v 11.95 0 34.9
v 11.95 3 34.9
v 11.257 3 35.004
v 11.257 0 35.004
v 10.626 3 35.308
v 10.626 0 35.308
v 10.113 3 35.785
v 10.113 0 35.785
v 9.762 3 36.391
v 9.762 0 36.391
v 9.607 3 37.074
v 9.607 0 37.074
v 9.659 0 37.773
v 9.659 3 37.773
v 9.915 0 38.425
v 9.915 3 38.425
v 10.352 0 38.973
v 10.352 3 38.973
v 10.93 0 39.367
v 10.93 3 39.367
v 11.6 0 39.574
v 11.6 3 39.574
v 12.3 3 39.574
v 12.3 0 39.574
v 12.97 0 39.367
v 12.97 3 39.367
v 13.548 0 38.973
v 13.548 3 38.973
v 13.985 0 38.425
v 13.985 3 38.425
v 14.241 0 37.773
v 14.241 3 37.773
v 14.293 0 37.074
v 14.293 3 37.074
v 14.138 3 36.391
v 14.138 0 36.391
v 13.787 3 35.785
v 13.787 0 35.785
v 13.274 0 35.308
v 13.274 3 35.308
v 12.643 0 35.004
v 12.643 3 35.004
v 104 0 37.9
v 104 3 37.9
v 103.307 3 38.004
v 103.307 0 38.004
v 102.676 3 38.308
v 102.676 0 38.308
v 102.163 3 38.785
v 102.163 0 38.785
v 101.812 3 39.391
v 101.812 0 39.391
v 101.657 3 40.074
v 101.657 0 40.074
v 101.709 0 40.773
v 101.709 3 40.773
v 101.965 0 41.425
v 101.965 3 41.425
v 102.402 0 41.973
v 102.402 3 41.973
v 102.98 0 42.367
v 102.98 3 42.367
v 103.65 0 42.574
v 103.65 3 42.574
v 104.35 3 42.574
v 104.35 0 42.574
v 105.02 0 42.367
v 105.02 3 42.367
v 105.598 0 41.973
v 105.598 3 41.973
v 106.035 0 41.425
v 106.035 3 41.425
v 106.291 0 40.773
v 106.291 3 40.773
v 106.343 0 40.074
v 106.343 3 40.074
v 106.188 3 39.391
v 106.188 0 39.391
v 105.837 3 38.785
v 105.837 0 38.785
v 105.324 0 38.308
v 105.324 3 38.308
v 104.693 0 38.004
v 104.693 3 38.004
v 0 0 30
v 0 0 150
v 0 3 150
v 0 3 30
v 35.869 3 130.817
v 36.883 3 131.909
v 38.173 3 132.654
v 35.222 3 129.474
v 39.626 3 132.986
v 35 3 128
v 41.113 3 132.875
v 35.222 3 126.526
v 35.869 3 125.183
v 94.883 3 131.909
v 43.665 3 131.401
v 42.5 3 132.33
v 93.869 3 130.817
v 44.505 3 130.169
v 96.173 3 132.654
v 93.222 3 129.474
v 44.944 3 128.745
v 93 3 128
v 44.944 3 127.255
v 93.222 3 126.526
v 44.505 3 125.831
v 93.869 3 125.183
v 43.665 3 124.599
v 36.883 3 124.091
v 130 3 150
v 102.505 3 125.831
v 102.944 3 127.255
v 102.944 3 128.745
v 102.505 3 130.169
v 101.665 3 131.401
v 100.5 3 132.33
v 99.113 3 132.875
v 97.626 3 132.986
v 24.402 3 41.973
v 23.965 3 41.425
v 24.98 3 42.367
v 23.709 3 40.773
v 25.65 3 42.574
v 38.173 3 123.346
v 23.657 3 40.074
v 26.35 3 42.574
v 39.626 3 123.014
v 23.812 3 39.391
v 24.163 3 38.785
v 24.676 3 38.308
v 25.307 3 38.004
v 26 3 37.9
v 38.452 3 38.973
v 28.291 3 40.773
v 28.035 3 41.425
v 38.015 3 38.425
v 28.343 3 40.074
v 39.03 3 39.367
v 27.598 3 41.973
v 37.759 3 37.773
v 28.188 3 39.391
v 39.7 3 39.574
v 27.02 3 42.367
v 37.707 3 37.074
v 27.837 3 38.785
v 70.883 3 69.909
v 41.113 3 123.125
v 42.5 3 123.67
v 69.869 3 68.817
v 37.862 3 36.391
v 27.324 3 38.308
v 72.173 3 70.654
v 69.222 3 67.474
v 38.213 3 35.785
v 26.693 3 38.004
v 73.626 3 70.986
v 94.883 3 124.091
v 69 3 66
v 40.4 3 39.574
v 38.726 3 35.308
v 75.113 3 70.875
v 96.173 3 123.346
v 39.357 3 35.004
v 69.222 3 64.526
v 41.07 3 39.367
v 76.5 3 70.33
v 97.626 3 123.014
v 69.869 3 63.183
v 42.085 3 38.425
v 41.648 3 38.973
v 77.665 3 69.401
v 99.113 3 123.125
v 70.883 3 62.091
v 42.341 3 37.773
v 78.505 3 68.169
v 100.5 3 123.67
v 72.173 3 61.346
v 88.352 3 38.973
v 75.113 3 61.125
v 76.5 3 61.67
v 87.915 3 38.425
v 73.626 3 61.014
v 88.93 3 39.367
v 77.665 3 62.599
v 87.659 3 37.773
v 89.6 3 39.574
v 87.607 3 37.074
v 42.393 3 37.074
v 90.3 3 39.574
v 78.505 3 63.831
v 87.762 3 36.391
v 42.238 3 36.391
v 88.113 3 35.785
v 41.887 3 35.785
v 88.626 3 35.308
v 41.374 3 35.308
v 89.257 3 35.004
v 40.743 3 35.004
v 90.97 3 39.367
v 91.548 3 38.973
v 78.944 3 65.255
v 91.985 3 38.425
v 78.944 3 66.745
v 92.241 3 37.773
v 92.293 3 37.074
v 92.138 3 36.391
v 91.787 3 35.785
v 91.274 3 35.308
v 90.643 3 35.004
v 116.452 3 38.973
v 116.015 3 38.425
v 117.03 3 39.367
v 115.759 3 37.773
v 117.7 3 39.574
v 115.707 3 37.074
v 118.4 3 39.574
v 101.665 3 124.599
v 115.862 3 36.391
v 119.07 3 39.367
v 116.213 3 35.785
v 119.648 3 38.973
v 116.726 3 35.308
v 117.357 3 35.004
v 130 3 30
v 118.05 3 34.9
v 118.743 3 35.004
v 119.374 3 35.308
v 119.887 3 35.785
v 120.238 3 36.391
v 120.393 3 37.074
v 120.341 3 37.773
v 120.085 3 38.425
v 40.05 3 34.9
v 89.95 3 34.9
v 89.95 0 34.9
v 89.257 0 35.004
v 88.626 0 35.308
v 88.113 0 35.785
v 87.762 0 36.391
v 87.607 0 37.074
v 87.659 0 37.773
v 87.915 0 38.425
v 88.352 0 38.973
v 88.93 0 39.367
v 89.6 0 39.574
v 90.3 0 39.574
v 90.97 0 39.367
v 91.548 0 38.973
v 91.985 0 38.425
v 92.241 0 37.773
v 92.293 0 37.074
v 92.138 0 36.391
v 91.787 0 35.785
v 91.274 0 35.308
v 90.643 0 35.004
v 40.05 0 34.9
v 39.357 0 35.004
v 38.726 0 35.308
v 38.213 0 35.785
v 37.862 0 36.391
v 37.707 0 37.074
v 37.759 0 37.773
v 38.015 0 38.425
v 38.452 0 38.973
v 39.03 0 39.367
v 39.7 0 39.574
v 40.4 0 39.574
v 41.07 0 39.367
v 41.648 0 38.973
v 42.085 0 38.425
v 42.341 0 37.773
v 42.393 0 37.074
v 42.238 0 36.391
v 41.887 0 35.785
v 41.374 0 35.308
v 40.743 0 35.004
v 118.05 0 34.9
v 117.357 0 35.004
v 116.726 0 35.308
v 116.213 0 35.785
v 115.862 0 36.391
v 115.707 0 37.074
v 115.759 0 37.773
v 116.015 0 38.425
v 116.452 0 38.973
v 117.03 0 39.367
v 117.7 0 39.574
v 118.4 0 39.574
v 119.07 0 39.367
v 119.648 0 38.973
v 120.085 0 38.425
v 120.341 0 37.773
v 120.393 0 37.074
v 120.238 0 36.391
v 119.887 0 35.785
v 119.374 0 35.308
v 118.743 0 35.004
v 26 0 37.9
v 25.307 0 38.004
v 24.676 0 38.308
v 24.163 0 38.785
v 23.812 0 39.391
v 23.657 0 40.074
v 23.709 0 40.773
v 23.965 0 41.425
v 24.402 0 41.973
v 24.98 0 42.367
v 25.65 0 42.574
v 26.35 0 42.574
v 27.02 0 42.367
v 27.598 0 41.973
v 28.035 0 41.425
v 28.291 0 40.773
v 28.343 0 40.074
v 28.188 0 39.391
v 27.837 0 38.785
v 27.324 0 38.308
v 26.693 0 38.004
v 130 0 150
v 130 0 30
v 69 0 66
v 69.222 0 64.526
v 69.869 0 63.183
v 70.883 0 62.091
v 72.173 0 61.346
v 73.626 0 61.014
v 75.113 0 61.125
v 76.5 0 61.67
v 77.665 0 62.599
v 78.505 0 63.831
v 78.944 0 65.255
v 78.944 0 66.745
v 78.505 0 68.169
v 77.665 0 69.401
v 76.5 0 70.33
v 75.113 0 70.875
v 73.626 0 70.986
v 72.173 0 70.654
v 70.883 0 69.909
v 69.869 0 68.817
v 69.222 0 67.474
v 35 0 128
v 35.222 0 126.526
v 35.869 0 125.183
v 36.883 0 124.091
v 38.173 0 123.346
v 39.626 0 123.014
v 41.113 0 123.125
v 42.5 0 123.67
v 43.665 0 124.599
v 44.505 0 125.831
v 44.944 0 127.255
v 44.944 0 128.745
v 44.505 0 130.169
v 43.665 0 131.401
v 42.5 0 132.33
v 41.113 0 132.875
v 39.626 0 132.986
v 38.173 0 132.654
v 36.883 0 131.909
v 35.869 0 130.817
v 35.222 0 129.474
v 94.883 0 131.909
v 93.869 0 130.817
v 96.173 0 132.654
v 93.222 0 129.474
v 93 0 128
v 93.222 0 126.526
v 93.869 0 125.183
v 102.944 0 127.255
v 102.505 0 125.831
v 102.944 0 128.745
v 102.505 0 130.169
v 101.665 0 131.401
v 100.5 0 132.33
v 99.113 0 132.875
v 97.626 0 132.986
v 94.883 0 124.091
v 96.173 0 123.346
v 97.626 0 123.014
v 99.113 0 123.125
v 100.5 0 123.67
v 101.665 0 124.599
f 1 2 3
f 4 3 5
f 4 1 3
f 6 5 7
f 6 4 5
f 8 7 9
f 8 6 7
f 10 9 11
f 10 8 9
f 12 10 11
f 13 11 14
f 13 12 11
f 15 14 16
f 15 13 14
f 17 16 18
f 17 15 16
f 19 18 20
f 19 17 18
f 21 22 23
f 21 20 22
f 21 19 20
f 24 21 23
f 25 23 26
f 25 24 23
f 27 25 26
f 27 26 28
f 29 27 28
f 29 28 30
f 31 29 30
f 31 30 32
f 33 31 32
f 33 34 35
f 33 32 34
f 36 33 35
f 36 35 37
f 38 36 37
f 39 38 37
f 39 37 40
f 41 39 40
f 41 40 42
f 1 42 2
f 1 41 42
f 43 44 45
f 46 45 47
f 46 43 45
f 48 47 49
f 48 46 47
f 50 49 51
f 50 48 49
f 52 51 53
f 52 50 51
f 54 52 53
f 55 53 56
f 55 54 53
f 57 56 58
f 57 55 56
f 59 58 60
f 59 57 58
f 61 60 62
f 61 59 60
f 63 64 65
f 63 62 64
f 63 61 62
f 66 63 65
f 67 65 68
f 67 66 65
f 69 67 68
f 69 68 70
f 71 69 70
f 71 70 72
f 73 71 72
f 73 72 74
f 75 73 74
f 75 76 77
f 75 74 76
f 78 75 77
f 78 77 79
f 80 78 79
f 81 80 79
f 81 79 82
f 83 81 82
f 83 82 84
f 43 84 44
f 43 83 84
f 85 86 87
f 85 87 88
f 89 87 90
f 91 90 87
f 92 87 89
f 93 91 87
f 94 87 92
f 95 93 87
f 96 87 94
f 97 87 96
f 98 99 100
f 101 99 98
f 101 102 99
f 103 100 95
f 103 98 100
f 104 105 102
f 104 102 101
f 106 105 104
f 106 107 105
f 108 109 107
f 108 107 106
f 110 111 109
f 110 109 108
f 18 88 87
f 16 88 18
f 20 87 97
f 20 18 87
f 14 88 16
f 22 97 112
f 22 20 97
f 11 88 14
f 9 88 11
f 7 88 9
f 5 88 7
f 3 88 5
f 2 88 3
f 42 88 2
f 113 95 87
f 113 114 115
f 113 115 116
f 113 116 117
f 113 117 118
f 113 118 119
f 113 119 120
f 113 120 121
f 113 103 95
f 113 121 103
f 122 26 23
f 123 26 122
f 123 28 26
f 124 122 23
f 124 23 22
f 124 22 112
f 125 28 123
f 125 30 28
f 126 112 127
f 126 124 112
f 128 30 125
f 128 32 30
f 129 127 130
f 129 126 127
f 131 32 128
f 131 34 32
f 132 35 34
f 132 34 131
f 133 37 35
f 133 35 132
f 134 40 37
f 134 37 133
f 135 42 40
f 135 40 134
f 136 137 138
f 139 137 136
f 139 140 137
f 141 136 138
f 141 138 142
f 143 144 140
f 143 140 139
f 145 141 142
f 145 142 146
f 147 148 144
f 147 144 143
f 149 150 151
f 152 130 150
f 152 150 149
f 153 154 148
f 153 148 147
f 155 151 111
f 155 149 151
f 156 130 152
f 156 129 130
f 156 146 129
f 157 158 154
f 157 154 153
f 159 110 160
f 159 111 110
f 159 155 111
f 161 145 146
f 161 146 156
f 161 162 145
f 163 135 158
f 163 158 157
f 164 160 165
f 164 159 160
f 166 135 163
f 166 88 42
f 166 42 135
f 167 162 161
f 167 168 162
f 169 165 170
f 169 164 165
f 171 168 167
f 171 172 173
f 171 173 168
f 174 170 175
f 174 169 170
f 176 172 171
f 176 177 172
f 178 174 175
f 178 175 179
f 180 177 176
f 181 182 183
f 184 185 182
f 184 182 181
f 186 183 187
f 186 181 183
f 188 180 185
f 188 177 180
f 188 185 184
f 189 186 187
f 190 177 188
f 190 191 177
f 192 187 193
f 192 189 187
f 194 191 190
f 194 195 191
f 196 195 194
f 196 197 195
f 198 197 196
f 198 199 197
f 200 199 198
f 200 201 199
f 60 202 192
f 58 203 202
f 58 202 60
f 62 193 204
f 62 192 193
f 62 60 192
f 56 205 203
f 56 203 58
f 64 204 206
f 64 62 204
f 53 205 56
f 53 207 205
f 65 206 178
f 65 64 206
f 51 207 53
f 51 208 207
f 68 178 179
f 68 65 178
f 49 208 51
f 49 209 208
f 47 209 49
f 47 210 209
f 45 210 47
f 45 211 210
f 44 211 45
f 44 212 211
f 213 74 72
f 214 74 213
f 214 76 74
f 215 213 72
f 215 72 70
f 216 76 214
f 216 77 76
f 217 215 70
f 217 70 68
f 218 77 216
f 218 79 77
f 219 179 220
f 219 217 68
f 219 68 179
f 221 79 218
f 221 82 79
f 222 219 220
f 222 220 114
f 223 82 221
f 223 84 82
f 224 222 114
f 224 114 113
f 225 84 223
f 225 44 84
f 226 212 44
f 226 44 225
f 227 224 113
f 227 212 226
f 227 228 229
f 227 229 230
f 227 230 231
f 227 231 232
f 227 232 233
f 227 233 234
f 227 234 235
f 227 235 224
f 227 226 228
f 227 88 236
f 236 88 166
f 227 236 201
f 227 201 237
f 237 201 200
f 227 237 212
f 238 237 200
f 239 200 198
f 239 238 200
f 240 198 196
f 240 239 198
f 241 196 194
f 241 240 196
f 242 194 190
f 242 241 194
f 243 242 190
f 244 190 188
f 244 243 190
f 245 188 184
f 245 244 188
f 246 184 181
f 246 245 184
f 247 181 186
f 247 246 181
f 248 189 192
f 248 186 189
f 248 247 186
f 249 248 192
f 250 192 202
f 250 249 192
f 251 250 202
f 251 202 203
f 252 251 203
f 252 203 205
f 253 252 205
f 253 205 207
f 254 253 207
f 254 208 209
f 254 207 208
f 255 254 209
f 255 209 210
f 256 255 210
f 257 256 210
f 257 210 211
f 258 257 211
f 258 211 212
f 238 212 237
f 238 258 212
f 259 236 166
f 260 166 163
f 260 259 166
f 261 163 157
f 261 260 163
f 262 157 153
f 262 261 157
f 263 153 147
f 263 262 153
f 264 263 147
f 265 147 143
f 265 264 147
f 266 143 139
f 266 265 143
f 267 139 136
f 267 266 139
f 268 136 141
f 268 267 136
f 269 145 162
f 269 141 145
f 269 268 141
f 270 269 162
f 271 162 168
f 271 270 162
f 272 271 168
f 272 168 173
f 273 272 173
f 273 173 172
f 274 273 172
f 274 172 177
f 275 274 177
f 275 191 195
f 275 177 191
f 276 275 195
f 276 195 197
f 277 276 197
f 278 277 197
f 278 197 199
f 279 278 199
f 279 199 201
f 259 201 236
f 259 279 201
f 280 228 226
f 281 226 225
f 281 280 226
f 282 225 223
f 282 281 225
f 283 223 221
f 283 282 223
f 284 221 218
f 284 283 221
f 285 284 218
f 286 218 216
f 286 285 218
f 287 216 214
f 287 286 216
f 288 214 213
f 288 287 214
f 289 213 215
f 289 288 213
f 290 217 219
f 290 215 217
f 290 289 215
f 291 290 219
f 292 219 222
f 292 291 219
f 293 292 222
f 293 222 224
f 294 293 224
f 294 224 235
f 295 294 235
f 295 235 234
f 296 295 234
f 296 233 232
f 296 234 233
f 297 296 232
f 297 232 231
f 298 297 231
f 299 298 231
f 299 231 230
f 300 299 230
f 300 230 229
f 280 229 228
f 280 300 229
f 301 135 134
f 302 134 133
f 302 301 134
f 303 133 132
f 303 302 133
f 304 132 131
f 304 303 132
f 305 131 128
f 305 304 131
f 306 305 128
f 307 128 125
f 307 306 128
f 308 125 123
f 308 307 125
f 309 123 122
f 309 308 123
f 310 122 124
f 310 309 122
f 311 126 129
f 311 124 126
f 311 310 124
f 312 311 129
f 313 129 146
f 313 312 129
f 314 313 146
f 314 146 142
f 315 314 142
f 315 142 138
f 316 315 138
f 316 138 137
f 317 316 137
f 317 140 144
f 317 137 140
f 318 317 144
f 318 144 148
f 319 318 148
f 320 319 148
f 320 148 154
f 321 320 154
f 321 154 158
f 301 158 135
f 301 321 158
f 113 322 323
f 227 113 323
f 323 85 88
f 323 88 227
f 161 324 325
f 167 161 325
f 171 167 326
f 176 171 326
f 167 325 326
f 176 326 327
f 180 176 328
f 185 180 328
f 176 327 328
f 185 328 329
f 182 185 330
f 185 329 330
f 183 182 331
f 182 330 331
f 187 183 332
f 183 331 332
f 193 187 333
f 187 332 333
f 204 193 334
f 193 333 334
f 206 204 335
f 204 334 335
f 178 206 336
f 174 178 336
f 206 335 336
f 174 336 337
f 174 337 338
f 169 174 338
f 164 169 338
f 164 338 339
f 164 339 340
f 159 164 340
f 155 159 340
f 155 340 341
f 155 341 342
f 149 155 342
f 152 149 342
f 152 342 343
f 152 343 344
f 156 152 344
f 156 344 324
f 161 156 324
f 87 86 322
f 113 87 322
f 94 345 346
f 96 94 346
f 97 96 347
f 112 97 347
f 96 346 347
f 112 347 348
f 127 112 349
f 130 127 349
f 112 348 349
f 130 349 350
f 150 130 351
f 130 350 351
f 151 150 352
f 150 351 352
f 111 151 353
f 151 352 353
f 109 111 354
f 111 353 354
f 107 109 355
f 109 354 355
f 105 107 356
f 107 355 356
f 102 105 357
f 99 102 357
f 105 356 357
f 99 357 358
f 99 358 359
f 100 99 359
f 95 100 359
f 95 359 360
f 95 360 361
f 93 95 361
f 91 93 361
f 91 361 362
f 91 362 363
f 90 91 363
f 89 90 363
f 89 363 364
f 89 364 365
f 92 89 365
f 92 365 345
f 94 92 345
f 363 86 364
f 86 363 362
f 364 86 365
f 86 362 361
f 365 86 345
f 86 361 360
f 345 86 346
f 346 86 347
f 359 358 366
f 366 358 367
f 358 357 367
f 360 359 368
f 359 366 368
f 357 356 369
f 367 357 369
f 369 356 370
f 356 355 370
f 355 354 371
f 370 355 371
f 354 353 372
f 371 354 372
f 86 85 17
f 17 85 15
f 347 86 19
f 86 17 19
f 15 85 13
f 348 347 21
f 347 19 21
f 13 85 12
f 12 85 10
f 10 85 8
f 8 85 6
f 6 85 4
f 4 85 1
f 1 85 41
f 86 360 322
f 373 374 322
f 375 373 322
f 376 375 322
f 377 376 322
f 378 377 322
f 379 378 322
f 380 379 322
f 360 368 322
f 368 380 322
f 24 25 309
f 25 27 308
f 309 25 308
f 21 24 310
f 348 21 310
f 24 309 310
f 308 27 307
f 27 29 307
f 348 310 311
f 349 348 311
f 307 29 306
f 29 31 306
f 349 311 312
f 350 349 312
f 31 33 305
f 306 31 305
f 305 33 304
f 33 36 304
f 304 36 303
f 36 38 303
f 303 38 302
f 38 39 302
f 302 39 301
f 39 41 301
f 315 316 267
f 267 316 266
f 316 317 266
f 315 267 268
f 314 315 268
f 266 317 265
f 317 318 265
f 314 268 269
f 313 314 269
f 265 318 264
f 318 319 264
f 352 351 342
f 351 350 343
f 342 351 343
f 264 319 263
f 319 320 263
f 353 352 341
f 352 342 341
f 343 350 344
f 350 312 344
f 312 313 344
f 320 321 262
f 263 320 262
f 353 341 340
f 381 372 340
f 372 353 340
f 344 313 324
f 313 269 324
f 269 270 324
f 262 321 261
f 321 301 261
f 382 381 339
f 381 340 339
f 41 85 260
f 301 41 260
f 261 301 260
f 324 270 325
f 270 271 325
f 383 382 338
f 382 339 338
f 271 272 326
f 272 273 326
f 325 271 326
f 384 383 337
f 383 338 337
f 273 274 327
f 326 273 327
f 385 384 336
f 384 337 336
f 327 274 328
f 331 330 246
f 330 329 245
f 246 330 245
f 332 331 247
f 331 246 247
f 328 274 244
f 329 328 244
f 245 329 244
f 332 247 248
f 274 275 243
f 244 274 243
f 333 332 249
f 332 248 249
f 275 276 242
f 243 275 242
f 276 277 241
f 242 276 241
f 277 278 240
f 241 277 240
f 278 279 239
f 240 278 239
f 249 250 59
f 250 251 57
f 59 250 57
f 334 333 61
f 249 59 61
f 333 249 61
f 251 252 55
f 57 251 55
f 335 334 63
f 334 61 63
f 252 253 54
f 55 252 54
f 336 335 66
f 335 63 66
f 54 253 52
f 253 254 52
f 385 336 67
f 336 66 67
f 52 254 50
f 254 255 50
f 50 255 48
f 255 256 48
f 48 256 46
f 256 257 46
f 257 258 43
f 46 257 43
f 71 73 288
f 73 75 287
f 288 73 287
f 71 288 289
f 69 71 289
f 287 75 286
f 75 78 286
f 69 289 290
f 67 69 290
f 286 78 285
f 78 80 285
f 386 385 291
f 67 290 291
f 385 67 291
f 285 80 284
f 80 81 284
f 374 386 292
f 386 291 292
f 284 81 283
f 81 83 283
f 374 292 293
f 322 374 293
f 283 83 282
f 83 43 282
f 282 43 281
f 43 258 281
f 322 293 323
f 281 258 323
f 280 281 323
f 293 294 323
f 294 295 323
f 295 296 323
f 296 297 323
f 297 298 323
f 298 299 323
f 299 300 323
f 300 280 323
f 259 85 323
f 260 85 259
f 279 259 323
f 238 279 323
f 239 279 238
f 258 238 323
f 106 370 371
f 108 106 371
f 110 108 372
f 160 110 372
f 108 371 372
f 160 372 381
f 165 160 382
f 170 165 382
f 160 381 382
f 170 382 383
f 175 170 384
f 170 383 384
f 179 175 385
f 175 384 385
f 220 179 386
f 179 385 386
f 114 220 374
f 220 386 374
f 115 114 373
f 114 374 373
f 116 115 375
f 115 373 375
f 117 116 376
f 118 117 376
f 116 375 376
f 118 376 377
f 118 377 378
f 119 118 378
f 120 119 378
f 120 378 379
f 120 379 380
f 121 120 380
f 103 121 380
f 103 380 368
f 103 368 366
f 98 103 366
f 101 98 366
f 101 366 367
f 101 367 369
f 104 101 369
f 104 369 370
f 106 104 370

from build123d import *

# Parameters (mm, degrees)
SKETCH1_W                  = 130
SKETCH1_H                  = 150
BOSS_EXTRUDE1_DEPTH        = 3
F_10_0_10_DIAMETER_HOLE2_D = 10
F_14_0_14_DIAMETER_HOLE1_D = 14
F_5_0_5_DIAMETER_HOLE1_D   = 5
F_9_0_9_DIAMETER_HOLE1_D   = 9
F_5_0_5_DIAMETER_HOLE2_D   = 5
SKETCH15_W                 = 130
SKETCH15_H                 = 30
CUT_EXTRUDE1_DEPTH         = 199.517001791
SKETCH16_R                 = 2.35
CUT_EXTRUDE2_DEPTH         = 199.517001791


with BuildPart() as part:
    # Sketch1 → Boss-Extrude1 (new body)
    with BuildSketch(Plane(origin=(0, 0, 0), x_dir=(1, 0, 0), z_dir=(0, 1, 0))):
        with Locations((65, -75)):
            Rectangle(SKETCH1_W, SKETCH1_H)
    extrude(amount=BOSS_EXTRUDE1_DEPTH)

    # Ø10.0 (10) Diameter Hole2 (through all)
    with Locations(Plane(origin=(0, 3, 0), x_dir=(1, 0, 0), z_dir=(0, 1, 0))):
        with Locations((40, -128), (98, -128), (74, -66)):
            Hole(F_10_0_10_DIAMETER_HOLE2_D / 2)

    # Ø14.0 (14) Diameter Hole1 (through all)
    with Locations(Plane(origin=(0, 3, 0), x_dir=(1, 0, 0), z_dir=(0, 1, 0))):
        with Locations((16, -16), (114, -16)):
            Hole(F_14_0_14_DIAMETER_HOLE1_D / 2)

    # Ø5.0 (5) Diameter Hole1 (through all)
    with Locations(Plane(origin=(0, 3, 0), x_dir=(1, 0, 0), z_dir=(0, 1, 0))):
        with Locations((4.686291501, -27.313708499), (4.686291501, -4.686291501), (27.313708499, -4.686291501), (27.313708499, -27.313708499), (102.686291501, -27.313708499), (125.313708499, -27.313708499), (125.313708499, -4.686291501), (102.686291501, -4.686291501)):
            Hole(F_5_0_5_DIAMETER_HOLE1_D / 2)

    # Ø9.0 (9) Diameter Hole1 (through all)
    with Locations(Plane(origin=(0, 3, 0), x_dir=(1, 0, 0), z_dir=(0, 1, 0))):
        with Locations((65, -16)):
            Hole(F_9_0_9_DIAMETER_HOLE1_D / 2)

    # Ø5.0 (5) Diameter Hole2 (through all)
    with Locations(Plane(origin=(0, 3, 0), x_dir=(1, 0, 0), z_dir=(0, 1, 0))):
        with Locations((53.686291501, -27.313708499), (76.313708499, -27.313708499), (76.313708499, -4.686291501), (53.686291501, -4.686291501)):
            Hole(F_5_0_5_DIAMETER_HOLE2_D / 2)

    # Sketch15 → Cut-Extrude1 (cut, through all)
    with BuildSketch(Plane(origin=(0, 0, 0), x_dir=(1, 0, 0), z_dir=(0, 1, 0))):
        with Locations((65, -15)):
            Rectangle(SKETCH15_W, SKETCH15_H)
    extrude(amount=CUT_EXTRUDE1_DEPTH, mode=Mode.SUBTRACT)

    # Sketch16 → Cut-Extrude2 (cut, through all)
    with BuildSketch(Plane(origin=(0, 0, 0), x_dir=(1, 0, 0), z_dir=(0, 1, 0))):
        with Locations(Location((89.95, -37.25, 0), (0, 0, 90))):
            Circle(SKETCH16_R)
        with Locations(Location((118.05, -37.25, 0), (0, 0, 90))):
            Circle(SKETCH16_R)
        with Locations(Location((104, -40.25, 0), (0, 0, 90))):
            Circle(SKETCH16_R)
        with Locations(Location((11.95, -37.25, 0), (0, 0, 90))):
            Circle(SKETCH16_R)
        with Locations(Location((40.05, -37.25, 0), (0, 0, 90))):
            Circle(SKETCH16_R)
        with Locations(Location((26, -40.25, 0), (0, 0, 90))):
            Circle(SKETCH16_R)
    extrude(amount=CUT_EXTRUDE2_DEPTH, mode=Mode.SUBTRACT)


solid = part.part
